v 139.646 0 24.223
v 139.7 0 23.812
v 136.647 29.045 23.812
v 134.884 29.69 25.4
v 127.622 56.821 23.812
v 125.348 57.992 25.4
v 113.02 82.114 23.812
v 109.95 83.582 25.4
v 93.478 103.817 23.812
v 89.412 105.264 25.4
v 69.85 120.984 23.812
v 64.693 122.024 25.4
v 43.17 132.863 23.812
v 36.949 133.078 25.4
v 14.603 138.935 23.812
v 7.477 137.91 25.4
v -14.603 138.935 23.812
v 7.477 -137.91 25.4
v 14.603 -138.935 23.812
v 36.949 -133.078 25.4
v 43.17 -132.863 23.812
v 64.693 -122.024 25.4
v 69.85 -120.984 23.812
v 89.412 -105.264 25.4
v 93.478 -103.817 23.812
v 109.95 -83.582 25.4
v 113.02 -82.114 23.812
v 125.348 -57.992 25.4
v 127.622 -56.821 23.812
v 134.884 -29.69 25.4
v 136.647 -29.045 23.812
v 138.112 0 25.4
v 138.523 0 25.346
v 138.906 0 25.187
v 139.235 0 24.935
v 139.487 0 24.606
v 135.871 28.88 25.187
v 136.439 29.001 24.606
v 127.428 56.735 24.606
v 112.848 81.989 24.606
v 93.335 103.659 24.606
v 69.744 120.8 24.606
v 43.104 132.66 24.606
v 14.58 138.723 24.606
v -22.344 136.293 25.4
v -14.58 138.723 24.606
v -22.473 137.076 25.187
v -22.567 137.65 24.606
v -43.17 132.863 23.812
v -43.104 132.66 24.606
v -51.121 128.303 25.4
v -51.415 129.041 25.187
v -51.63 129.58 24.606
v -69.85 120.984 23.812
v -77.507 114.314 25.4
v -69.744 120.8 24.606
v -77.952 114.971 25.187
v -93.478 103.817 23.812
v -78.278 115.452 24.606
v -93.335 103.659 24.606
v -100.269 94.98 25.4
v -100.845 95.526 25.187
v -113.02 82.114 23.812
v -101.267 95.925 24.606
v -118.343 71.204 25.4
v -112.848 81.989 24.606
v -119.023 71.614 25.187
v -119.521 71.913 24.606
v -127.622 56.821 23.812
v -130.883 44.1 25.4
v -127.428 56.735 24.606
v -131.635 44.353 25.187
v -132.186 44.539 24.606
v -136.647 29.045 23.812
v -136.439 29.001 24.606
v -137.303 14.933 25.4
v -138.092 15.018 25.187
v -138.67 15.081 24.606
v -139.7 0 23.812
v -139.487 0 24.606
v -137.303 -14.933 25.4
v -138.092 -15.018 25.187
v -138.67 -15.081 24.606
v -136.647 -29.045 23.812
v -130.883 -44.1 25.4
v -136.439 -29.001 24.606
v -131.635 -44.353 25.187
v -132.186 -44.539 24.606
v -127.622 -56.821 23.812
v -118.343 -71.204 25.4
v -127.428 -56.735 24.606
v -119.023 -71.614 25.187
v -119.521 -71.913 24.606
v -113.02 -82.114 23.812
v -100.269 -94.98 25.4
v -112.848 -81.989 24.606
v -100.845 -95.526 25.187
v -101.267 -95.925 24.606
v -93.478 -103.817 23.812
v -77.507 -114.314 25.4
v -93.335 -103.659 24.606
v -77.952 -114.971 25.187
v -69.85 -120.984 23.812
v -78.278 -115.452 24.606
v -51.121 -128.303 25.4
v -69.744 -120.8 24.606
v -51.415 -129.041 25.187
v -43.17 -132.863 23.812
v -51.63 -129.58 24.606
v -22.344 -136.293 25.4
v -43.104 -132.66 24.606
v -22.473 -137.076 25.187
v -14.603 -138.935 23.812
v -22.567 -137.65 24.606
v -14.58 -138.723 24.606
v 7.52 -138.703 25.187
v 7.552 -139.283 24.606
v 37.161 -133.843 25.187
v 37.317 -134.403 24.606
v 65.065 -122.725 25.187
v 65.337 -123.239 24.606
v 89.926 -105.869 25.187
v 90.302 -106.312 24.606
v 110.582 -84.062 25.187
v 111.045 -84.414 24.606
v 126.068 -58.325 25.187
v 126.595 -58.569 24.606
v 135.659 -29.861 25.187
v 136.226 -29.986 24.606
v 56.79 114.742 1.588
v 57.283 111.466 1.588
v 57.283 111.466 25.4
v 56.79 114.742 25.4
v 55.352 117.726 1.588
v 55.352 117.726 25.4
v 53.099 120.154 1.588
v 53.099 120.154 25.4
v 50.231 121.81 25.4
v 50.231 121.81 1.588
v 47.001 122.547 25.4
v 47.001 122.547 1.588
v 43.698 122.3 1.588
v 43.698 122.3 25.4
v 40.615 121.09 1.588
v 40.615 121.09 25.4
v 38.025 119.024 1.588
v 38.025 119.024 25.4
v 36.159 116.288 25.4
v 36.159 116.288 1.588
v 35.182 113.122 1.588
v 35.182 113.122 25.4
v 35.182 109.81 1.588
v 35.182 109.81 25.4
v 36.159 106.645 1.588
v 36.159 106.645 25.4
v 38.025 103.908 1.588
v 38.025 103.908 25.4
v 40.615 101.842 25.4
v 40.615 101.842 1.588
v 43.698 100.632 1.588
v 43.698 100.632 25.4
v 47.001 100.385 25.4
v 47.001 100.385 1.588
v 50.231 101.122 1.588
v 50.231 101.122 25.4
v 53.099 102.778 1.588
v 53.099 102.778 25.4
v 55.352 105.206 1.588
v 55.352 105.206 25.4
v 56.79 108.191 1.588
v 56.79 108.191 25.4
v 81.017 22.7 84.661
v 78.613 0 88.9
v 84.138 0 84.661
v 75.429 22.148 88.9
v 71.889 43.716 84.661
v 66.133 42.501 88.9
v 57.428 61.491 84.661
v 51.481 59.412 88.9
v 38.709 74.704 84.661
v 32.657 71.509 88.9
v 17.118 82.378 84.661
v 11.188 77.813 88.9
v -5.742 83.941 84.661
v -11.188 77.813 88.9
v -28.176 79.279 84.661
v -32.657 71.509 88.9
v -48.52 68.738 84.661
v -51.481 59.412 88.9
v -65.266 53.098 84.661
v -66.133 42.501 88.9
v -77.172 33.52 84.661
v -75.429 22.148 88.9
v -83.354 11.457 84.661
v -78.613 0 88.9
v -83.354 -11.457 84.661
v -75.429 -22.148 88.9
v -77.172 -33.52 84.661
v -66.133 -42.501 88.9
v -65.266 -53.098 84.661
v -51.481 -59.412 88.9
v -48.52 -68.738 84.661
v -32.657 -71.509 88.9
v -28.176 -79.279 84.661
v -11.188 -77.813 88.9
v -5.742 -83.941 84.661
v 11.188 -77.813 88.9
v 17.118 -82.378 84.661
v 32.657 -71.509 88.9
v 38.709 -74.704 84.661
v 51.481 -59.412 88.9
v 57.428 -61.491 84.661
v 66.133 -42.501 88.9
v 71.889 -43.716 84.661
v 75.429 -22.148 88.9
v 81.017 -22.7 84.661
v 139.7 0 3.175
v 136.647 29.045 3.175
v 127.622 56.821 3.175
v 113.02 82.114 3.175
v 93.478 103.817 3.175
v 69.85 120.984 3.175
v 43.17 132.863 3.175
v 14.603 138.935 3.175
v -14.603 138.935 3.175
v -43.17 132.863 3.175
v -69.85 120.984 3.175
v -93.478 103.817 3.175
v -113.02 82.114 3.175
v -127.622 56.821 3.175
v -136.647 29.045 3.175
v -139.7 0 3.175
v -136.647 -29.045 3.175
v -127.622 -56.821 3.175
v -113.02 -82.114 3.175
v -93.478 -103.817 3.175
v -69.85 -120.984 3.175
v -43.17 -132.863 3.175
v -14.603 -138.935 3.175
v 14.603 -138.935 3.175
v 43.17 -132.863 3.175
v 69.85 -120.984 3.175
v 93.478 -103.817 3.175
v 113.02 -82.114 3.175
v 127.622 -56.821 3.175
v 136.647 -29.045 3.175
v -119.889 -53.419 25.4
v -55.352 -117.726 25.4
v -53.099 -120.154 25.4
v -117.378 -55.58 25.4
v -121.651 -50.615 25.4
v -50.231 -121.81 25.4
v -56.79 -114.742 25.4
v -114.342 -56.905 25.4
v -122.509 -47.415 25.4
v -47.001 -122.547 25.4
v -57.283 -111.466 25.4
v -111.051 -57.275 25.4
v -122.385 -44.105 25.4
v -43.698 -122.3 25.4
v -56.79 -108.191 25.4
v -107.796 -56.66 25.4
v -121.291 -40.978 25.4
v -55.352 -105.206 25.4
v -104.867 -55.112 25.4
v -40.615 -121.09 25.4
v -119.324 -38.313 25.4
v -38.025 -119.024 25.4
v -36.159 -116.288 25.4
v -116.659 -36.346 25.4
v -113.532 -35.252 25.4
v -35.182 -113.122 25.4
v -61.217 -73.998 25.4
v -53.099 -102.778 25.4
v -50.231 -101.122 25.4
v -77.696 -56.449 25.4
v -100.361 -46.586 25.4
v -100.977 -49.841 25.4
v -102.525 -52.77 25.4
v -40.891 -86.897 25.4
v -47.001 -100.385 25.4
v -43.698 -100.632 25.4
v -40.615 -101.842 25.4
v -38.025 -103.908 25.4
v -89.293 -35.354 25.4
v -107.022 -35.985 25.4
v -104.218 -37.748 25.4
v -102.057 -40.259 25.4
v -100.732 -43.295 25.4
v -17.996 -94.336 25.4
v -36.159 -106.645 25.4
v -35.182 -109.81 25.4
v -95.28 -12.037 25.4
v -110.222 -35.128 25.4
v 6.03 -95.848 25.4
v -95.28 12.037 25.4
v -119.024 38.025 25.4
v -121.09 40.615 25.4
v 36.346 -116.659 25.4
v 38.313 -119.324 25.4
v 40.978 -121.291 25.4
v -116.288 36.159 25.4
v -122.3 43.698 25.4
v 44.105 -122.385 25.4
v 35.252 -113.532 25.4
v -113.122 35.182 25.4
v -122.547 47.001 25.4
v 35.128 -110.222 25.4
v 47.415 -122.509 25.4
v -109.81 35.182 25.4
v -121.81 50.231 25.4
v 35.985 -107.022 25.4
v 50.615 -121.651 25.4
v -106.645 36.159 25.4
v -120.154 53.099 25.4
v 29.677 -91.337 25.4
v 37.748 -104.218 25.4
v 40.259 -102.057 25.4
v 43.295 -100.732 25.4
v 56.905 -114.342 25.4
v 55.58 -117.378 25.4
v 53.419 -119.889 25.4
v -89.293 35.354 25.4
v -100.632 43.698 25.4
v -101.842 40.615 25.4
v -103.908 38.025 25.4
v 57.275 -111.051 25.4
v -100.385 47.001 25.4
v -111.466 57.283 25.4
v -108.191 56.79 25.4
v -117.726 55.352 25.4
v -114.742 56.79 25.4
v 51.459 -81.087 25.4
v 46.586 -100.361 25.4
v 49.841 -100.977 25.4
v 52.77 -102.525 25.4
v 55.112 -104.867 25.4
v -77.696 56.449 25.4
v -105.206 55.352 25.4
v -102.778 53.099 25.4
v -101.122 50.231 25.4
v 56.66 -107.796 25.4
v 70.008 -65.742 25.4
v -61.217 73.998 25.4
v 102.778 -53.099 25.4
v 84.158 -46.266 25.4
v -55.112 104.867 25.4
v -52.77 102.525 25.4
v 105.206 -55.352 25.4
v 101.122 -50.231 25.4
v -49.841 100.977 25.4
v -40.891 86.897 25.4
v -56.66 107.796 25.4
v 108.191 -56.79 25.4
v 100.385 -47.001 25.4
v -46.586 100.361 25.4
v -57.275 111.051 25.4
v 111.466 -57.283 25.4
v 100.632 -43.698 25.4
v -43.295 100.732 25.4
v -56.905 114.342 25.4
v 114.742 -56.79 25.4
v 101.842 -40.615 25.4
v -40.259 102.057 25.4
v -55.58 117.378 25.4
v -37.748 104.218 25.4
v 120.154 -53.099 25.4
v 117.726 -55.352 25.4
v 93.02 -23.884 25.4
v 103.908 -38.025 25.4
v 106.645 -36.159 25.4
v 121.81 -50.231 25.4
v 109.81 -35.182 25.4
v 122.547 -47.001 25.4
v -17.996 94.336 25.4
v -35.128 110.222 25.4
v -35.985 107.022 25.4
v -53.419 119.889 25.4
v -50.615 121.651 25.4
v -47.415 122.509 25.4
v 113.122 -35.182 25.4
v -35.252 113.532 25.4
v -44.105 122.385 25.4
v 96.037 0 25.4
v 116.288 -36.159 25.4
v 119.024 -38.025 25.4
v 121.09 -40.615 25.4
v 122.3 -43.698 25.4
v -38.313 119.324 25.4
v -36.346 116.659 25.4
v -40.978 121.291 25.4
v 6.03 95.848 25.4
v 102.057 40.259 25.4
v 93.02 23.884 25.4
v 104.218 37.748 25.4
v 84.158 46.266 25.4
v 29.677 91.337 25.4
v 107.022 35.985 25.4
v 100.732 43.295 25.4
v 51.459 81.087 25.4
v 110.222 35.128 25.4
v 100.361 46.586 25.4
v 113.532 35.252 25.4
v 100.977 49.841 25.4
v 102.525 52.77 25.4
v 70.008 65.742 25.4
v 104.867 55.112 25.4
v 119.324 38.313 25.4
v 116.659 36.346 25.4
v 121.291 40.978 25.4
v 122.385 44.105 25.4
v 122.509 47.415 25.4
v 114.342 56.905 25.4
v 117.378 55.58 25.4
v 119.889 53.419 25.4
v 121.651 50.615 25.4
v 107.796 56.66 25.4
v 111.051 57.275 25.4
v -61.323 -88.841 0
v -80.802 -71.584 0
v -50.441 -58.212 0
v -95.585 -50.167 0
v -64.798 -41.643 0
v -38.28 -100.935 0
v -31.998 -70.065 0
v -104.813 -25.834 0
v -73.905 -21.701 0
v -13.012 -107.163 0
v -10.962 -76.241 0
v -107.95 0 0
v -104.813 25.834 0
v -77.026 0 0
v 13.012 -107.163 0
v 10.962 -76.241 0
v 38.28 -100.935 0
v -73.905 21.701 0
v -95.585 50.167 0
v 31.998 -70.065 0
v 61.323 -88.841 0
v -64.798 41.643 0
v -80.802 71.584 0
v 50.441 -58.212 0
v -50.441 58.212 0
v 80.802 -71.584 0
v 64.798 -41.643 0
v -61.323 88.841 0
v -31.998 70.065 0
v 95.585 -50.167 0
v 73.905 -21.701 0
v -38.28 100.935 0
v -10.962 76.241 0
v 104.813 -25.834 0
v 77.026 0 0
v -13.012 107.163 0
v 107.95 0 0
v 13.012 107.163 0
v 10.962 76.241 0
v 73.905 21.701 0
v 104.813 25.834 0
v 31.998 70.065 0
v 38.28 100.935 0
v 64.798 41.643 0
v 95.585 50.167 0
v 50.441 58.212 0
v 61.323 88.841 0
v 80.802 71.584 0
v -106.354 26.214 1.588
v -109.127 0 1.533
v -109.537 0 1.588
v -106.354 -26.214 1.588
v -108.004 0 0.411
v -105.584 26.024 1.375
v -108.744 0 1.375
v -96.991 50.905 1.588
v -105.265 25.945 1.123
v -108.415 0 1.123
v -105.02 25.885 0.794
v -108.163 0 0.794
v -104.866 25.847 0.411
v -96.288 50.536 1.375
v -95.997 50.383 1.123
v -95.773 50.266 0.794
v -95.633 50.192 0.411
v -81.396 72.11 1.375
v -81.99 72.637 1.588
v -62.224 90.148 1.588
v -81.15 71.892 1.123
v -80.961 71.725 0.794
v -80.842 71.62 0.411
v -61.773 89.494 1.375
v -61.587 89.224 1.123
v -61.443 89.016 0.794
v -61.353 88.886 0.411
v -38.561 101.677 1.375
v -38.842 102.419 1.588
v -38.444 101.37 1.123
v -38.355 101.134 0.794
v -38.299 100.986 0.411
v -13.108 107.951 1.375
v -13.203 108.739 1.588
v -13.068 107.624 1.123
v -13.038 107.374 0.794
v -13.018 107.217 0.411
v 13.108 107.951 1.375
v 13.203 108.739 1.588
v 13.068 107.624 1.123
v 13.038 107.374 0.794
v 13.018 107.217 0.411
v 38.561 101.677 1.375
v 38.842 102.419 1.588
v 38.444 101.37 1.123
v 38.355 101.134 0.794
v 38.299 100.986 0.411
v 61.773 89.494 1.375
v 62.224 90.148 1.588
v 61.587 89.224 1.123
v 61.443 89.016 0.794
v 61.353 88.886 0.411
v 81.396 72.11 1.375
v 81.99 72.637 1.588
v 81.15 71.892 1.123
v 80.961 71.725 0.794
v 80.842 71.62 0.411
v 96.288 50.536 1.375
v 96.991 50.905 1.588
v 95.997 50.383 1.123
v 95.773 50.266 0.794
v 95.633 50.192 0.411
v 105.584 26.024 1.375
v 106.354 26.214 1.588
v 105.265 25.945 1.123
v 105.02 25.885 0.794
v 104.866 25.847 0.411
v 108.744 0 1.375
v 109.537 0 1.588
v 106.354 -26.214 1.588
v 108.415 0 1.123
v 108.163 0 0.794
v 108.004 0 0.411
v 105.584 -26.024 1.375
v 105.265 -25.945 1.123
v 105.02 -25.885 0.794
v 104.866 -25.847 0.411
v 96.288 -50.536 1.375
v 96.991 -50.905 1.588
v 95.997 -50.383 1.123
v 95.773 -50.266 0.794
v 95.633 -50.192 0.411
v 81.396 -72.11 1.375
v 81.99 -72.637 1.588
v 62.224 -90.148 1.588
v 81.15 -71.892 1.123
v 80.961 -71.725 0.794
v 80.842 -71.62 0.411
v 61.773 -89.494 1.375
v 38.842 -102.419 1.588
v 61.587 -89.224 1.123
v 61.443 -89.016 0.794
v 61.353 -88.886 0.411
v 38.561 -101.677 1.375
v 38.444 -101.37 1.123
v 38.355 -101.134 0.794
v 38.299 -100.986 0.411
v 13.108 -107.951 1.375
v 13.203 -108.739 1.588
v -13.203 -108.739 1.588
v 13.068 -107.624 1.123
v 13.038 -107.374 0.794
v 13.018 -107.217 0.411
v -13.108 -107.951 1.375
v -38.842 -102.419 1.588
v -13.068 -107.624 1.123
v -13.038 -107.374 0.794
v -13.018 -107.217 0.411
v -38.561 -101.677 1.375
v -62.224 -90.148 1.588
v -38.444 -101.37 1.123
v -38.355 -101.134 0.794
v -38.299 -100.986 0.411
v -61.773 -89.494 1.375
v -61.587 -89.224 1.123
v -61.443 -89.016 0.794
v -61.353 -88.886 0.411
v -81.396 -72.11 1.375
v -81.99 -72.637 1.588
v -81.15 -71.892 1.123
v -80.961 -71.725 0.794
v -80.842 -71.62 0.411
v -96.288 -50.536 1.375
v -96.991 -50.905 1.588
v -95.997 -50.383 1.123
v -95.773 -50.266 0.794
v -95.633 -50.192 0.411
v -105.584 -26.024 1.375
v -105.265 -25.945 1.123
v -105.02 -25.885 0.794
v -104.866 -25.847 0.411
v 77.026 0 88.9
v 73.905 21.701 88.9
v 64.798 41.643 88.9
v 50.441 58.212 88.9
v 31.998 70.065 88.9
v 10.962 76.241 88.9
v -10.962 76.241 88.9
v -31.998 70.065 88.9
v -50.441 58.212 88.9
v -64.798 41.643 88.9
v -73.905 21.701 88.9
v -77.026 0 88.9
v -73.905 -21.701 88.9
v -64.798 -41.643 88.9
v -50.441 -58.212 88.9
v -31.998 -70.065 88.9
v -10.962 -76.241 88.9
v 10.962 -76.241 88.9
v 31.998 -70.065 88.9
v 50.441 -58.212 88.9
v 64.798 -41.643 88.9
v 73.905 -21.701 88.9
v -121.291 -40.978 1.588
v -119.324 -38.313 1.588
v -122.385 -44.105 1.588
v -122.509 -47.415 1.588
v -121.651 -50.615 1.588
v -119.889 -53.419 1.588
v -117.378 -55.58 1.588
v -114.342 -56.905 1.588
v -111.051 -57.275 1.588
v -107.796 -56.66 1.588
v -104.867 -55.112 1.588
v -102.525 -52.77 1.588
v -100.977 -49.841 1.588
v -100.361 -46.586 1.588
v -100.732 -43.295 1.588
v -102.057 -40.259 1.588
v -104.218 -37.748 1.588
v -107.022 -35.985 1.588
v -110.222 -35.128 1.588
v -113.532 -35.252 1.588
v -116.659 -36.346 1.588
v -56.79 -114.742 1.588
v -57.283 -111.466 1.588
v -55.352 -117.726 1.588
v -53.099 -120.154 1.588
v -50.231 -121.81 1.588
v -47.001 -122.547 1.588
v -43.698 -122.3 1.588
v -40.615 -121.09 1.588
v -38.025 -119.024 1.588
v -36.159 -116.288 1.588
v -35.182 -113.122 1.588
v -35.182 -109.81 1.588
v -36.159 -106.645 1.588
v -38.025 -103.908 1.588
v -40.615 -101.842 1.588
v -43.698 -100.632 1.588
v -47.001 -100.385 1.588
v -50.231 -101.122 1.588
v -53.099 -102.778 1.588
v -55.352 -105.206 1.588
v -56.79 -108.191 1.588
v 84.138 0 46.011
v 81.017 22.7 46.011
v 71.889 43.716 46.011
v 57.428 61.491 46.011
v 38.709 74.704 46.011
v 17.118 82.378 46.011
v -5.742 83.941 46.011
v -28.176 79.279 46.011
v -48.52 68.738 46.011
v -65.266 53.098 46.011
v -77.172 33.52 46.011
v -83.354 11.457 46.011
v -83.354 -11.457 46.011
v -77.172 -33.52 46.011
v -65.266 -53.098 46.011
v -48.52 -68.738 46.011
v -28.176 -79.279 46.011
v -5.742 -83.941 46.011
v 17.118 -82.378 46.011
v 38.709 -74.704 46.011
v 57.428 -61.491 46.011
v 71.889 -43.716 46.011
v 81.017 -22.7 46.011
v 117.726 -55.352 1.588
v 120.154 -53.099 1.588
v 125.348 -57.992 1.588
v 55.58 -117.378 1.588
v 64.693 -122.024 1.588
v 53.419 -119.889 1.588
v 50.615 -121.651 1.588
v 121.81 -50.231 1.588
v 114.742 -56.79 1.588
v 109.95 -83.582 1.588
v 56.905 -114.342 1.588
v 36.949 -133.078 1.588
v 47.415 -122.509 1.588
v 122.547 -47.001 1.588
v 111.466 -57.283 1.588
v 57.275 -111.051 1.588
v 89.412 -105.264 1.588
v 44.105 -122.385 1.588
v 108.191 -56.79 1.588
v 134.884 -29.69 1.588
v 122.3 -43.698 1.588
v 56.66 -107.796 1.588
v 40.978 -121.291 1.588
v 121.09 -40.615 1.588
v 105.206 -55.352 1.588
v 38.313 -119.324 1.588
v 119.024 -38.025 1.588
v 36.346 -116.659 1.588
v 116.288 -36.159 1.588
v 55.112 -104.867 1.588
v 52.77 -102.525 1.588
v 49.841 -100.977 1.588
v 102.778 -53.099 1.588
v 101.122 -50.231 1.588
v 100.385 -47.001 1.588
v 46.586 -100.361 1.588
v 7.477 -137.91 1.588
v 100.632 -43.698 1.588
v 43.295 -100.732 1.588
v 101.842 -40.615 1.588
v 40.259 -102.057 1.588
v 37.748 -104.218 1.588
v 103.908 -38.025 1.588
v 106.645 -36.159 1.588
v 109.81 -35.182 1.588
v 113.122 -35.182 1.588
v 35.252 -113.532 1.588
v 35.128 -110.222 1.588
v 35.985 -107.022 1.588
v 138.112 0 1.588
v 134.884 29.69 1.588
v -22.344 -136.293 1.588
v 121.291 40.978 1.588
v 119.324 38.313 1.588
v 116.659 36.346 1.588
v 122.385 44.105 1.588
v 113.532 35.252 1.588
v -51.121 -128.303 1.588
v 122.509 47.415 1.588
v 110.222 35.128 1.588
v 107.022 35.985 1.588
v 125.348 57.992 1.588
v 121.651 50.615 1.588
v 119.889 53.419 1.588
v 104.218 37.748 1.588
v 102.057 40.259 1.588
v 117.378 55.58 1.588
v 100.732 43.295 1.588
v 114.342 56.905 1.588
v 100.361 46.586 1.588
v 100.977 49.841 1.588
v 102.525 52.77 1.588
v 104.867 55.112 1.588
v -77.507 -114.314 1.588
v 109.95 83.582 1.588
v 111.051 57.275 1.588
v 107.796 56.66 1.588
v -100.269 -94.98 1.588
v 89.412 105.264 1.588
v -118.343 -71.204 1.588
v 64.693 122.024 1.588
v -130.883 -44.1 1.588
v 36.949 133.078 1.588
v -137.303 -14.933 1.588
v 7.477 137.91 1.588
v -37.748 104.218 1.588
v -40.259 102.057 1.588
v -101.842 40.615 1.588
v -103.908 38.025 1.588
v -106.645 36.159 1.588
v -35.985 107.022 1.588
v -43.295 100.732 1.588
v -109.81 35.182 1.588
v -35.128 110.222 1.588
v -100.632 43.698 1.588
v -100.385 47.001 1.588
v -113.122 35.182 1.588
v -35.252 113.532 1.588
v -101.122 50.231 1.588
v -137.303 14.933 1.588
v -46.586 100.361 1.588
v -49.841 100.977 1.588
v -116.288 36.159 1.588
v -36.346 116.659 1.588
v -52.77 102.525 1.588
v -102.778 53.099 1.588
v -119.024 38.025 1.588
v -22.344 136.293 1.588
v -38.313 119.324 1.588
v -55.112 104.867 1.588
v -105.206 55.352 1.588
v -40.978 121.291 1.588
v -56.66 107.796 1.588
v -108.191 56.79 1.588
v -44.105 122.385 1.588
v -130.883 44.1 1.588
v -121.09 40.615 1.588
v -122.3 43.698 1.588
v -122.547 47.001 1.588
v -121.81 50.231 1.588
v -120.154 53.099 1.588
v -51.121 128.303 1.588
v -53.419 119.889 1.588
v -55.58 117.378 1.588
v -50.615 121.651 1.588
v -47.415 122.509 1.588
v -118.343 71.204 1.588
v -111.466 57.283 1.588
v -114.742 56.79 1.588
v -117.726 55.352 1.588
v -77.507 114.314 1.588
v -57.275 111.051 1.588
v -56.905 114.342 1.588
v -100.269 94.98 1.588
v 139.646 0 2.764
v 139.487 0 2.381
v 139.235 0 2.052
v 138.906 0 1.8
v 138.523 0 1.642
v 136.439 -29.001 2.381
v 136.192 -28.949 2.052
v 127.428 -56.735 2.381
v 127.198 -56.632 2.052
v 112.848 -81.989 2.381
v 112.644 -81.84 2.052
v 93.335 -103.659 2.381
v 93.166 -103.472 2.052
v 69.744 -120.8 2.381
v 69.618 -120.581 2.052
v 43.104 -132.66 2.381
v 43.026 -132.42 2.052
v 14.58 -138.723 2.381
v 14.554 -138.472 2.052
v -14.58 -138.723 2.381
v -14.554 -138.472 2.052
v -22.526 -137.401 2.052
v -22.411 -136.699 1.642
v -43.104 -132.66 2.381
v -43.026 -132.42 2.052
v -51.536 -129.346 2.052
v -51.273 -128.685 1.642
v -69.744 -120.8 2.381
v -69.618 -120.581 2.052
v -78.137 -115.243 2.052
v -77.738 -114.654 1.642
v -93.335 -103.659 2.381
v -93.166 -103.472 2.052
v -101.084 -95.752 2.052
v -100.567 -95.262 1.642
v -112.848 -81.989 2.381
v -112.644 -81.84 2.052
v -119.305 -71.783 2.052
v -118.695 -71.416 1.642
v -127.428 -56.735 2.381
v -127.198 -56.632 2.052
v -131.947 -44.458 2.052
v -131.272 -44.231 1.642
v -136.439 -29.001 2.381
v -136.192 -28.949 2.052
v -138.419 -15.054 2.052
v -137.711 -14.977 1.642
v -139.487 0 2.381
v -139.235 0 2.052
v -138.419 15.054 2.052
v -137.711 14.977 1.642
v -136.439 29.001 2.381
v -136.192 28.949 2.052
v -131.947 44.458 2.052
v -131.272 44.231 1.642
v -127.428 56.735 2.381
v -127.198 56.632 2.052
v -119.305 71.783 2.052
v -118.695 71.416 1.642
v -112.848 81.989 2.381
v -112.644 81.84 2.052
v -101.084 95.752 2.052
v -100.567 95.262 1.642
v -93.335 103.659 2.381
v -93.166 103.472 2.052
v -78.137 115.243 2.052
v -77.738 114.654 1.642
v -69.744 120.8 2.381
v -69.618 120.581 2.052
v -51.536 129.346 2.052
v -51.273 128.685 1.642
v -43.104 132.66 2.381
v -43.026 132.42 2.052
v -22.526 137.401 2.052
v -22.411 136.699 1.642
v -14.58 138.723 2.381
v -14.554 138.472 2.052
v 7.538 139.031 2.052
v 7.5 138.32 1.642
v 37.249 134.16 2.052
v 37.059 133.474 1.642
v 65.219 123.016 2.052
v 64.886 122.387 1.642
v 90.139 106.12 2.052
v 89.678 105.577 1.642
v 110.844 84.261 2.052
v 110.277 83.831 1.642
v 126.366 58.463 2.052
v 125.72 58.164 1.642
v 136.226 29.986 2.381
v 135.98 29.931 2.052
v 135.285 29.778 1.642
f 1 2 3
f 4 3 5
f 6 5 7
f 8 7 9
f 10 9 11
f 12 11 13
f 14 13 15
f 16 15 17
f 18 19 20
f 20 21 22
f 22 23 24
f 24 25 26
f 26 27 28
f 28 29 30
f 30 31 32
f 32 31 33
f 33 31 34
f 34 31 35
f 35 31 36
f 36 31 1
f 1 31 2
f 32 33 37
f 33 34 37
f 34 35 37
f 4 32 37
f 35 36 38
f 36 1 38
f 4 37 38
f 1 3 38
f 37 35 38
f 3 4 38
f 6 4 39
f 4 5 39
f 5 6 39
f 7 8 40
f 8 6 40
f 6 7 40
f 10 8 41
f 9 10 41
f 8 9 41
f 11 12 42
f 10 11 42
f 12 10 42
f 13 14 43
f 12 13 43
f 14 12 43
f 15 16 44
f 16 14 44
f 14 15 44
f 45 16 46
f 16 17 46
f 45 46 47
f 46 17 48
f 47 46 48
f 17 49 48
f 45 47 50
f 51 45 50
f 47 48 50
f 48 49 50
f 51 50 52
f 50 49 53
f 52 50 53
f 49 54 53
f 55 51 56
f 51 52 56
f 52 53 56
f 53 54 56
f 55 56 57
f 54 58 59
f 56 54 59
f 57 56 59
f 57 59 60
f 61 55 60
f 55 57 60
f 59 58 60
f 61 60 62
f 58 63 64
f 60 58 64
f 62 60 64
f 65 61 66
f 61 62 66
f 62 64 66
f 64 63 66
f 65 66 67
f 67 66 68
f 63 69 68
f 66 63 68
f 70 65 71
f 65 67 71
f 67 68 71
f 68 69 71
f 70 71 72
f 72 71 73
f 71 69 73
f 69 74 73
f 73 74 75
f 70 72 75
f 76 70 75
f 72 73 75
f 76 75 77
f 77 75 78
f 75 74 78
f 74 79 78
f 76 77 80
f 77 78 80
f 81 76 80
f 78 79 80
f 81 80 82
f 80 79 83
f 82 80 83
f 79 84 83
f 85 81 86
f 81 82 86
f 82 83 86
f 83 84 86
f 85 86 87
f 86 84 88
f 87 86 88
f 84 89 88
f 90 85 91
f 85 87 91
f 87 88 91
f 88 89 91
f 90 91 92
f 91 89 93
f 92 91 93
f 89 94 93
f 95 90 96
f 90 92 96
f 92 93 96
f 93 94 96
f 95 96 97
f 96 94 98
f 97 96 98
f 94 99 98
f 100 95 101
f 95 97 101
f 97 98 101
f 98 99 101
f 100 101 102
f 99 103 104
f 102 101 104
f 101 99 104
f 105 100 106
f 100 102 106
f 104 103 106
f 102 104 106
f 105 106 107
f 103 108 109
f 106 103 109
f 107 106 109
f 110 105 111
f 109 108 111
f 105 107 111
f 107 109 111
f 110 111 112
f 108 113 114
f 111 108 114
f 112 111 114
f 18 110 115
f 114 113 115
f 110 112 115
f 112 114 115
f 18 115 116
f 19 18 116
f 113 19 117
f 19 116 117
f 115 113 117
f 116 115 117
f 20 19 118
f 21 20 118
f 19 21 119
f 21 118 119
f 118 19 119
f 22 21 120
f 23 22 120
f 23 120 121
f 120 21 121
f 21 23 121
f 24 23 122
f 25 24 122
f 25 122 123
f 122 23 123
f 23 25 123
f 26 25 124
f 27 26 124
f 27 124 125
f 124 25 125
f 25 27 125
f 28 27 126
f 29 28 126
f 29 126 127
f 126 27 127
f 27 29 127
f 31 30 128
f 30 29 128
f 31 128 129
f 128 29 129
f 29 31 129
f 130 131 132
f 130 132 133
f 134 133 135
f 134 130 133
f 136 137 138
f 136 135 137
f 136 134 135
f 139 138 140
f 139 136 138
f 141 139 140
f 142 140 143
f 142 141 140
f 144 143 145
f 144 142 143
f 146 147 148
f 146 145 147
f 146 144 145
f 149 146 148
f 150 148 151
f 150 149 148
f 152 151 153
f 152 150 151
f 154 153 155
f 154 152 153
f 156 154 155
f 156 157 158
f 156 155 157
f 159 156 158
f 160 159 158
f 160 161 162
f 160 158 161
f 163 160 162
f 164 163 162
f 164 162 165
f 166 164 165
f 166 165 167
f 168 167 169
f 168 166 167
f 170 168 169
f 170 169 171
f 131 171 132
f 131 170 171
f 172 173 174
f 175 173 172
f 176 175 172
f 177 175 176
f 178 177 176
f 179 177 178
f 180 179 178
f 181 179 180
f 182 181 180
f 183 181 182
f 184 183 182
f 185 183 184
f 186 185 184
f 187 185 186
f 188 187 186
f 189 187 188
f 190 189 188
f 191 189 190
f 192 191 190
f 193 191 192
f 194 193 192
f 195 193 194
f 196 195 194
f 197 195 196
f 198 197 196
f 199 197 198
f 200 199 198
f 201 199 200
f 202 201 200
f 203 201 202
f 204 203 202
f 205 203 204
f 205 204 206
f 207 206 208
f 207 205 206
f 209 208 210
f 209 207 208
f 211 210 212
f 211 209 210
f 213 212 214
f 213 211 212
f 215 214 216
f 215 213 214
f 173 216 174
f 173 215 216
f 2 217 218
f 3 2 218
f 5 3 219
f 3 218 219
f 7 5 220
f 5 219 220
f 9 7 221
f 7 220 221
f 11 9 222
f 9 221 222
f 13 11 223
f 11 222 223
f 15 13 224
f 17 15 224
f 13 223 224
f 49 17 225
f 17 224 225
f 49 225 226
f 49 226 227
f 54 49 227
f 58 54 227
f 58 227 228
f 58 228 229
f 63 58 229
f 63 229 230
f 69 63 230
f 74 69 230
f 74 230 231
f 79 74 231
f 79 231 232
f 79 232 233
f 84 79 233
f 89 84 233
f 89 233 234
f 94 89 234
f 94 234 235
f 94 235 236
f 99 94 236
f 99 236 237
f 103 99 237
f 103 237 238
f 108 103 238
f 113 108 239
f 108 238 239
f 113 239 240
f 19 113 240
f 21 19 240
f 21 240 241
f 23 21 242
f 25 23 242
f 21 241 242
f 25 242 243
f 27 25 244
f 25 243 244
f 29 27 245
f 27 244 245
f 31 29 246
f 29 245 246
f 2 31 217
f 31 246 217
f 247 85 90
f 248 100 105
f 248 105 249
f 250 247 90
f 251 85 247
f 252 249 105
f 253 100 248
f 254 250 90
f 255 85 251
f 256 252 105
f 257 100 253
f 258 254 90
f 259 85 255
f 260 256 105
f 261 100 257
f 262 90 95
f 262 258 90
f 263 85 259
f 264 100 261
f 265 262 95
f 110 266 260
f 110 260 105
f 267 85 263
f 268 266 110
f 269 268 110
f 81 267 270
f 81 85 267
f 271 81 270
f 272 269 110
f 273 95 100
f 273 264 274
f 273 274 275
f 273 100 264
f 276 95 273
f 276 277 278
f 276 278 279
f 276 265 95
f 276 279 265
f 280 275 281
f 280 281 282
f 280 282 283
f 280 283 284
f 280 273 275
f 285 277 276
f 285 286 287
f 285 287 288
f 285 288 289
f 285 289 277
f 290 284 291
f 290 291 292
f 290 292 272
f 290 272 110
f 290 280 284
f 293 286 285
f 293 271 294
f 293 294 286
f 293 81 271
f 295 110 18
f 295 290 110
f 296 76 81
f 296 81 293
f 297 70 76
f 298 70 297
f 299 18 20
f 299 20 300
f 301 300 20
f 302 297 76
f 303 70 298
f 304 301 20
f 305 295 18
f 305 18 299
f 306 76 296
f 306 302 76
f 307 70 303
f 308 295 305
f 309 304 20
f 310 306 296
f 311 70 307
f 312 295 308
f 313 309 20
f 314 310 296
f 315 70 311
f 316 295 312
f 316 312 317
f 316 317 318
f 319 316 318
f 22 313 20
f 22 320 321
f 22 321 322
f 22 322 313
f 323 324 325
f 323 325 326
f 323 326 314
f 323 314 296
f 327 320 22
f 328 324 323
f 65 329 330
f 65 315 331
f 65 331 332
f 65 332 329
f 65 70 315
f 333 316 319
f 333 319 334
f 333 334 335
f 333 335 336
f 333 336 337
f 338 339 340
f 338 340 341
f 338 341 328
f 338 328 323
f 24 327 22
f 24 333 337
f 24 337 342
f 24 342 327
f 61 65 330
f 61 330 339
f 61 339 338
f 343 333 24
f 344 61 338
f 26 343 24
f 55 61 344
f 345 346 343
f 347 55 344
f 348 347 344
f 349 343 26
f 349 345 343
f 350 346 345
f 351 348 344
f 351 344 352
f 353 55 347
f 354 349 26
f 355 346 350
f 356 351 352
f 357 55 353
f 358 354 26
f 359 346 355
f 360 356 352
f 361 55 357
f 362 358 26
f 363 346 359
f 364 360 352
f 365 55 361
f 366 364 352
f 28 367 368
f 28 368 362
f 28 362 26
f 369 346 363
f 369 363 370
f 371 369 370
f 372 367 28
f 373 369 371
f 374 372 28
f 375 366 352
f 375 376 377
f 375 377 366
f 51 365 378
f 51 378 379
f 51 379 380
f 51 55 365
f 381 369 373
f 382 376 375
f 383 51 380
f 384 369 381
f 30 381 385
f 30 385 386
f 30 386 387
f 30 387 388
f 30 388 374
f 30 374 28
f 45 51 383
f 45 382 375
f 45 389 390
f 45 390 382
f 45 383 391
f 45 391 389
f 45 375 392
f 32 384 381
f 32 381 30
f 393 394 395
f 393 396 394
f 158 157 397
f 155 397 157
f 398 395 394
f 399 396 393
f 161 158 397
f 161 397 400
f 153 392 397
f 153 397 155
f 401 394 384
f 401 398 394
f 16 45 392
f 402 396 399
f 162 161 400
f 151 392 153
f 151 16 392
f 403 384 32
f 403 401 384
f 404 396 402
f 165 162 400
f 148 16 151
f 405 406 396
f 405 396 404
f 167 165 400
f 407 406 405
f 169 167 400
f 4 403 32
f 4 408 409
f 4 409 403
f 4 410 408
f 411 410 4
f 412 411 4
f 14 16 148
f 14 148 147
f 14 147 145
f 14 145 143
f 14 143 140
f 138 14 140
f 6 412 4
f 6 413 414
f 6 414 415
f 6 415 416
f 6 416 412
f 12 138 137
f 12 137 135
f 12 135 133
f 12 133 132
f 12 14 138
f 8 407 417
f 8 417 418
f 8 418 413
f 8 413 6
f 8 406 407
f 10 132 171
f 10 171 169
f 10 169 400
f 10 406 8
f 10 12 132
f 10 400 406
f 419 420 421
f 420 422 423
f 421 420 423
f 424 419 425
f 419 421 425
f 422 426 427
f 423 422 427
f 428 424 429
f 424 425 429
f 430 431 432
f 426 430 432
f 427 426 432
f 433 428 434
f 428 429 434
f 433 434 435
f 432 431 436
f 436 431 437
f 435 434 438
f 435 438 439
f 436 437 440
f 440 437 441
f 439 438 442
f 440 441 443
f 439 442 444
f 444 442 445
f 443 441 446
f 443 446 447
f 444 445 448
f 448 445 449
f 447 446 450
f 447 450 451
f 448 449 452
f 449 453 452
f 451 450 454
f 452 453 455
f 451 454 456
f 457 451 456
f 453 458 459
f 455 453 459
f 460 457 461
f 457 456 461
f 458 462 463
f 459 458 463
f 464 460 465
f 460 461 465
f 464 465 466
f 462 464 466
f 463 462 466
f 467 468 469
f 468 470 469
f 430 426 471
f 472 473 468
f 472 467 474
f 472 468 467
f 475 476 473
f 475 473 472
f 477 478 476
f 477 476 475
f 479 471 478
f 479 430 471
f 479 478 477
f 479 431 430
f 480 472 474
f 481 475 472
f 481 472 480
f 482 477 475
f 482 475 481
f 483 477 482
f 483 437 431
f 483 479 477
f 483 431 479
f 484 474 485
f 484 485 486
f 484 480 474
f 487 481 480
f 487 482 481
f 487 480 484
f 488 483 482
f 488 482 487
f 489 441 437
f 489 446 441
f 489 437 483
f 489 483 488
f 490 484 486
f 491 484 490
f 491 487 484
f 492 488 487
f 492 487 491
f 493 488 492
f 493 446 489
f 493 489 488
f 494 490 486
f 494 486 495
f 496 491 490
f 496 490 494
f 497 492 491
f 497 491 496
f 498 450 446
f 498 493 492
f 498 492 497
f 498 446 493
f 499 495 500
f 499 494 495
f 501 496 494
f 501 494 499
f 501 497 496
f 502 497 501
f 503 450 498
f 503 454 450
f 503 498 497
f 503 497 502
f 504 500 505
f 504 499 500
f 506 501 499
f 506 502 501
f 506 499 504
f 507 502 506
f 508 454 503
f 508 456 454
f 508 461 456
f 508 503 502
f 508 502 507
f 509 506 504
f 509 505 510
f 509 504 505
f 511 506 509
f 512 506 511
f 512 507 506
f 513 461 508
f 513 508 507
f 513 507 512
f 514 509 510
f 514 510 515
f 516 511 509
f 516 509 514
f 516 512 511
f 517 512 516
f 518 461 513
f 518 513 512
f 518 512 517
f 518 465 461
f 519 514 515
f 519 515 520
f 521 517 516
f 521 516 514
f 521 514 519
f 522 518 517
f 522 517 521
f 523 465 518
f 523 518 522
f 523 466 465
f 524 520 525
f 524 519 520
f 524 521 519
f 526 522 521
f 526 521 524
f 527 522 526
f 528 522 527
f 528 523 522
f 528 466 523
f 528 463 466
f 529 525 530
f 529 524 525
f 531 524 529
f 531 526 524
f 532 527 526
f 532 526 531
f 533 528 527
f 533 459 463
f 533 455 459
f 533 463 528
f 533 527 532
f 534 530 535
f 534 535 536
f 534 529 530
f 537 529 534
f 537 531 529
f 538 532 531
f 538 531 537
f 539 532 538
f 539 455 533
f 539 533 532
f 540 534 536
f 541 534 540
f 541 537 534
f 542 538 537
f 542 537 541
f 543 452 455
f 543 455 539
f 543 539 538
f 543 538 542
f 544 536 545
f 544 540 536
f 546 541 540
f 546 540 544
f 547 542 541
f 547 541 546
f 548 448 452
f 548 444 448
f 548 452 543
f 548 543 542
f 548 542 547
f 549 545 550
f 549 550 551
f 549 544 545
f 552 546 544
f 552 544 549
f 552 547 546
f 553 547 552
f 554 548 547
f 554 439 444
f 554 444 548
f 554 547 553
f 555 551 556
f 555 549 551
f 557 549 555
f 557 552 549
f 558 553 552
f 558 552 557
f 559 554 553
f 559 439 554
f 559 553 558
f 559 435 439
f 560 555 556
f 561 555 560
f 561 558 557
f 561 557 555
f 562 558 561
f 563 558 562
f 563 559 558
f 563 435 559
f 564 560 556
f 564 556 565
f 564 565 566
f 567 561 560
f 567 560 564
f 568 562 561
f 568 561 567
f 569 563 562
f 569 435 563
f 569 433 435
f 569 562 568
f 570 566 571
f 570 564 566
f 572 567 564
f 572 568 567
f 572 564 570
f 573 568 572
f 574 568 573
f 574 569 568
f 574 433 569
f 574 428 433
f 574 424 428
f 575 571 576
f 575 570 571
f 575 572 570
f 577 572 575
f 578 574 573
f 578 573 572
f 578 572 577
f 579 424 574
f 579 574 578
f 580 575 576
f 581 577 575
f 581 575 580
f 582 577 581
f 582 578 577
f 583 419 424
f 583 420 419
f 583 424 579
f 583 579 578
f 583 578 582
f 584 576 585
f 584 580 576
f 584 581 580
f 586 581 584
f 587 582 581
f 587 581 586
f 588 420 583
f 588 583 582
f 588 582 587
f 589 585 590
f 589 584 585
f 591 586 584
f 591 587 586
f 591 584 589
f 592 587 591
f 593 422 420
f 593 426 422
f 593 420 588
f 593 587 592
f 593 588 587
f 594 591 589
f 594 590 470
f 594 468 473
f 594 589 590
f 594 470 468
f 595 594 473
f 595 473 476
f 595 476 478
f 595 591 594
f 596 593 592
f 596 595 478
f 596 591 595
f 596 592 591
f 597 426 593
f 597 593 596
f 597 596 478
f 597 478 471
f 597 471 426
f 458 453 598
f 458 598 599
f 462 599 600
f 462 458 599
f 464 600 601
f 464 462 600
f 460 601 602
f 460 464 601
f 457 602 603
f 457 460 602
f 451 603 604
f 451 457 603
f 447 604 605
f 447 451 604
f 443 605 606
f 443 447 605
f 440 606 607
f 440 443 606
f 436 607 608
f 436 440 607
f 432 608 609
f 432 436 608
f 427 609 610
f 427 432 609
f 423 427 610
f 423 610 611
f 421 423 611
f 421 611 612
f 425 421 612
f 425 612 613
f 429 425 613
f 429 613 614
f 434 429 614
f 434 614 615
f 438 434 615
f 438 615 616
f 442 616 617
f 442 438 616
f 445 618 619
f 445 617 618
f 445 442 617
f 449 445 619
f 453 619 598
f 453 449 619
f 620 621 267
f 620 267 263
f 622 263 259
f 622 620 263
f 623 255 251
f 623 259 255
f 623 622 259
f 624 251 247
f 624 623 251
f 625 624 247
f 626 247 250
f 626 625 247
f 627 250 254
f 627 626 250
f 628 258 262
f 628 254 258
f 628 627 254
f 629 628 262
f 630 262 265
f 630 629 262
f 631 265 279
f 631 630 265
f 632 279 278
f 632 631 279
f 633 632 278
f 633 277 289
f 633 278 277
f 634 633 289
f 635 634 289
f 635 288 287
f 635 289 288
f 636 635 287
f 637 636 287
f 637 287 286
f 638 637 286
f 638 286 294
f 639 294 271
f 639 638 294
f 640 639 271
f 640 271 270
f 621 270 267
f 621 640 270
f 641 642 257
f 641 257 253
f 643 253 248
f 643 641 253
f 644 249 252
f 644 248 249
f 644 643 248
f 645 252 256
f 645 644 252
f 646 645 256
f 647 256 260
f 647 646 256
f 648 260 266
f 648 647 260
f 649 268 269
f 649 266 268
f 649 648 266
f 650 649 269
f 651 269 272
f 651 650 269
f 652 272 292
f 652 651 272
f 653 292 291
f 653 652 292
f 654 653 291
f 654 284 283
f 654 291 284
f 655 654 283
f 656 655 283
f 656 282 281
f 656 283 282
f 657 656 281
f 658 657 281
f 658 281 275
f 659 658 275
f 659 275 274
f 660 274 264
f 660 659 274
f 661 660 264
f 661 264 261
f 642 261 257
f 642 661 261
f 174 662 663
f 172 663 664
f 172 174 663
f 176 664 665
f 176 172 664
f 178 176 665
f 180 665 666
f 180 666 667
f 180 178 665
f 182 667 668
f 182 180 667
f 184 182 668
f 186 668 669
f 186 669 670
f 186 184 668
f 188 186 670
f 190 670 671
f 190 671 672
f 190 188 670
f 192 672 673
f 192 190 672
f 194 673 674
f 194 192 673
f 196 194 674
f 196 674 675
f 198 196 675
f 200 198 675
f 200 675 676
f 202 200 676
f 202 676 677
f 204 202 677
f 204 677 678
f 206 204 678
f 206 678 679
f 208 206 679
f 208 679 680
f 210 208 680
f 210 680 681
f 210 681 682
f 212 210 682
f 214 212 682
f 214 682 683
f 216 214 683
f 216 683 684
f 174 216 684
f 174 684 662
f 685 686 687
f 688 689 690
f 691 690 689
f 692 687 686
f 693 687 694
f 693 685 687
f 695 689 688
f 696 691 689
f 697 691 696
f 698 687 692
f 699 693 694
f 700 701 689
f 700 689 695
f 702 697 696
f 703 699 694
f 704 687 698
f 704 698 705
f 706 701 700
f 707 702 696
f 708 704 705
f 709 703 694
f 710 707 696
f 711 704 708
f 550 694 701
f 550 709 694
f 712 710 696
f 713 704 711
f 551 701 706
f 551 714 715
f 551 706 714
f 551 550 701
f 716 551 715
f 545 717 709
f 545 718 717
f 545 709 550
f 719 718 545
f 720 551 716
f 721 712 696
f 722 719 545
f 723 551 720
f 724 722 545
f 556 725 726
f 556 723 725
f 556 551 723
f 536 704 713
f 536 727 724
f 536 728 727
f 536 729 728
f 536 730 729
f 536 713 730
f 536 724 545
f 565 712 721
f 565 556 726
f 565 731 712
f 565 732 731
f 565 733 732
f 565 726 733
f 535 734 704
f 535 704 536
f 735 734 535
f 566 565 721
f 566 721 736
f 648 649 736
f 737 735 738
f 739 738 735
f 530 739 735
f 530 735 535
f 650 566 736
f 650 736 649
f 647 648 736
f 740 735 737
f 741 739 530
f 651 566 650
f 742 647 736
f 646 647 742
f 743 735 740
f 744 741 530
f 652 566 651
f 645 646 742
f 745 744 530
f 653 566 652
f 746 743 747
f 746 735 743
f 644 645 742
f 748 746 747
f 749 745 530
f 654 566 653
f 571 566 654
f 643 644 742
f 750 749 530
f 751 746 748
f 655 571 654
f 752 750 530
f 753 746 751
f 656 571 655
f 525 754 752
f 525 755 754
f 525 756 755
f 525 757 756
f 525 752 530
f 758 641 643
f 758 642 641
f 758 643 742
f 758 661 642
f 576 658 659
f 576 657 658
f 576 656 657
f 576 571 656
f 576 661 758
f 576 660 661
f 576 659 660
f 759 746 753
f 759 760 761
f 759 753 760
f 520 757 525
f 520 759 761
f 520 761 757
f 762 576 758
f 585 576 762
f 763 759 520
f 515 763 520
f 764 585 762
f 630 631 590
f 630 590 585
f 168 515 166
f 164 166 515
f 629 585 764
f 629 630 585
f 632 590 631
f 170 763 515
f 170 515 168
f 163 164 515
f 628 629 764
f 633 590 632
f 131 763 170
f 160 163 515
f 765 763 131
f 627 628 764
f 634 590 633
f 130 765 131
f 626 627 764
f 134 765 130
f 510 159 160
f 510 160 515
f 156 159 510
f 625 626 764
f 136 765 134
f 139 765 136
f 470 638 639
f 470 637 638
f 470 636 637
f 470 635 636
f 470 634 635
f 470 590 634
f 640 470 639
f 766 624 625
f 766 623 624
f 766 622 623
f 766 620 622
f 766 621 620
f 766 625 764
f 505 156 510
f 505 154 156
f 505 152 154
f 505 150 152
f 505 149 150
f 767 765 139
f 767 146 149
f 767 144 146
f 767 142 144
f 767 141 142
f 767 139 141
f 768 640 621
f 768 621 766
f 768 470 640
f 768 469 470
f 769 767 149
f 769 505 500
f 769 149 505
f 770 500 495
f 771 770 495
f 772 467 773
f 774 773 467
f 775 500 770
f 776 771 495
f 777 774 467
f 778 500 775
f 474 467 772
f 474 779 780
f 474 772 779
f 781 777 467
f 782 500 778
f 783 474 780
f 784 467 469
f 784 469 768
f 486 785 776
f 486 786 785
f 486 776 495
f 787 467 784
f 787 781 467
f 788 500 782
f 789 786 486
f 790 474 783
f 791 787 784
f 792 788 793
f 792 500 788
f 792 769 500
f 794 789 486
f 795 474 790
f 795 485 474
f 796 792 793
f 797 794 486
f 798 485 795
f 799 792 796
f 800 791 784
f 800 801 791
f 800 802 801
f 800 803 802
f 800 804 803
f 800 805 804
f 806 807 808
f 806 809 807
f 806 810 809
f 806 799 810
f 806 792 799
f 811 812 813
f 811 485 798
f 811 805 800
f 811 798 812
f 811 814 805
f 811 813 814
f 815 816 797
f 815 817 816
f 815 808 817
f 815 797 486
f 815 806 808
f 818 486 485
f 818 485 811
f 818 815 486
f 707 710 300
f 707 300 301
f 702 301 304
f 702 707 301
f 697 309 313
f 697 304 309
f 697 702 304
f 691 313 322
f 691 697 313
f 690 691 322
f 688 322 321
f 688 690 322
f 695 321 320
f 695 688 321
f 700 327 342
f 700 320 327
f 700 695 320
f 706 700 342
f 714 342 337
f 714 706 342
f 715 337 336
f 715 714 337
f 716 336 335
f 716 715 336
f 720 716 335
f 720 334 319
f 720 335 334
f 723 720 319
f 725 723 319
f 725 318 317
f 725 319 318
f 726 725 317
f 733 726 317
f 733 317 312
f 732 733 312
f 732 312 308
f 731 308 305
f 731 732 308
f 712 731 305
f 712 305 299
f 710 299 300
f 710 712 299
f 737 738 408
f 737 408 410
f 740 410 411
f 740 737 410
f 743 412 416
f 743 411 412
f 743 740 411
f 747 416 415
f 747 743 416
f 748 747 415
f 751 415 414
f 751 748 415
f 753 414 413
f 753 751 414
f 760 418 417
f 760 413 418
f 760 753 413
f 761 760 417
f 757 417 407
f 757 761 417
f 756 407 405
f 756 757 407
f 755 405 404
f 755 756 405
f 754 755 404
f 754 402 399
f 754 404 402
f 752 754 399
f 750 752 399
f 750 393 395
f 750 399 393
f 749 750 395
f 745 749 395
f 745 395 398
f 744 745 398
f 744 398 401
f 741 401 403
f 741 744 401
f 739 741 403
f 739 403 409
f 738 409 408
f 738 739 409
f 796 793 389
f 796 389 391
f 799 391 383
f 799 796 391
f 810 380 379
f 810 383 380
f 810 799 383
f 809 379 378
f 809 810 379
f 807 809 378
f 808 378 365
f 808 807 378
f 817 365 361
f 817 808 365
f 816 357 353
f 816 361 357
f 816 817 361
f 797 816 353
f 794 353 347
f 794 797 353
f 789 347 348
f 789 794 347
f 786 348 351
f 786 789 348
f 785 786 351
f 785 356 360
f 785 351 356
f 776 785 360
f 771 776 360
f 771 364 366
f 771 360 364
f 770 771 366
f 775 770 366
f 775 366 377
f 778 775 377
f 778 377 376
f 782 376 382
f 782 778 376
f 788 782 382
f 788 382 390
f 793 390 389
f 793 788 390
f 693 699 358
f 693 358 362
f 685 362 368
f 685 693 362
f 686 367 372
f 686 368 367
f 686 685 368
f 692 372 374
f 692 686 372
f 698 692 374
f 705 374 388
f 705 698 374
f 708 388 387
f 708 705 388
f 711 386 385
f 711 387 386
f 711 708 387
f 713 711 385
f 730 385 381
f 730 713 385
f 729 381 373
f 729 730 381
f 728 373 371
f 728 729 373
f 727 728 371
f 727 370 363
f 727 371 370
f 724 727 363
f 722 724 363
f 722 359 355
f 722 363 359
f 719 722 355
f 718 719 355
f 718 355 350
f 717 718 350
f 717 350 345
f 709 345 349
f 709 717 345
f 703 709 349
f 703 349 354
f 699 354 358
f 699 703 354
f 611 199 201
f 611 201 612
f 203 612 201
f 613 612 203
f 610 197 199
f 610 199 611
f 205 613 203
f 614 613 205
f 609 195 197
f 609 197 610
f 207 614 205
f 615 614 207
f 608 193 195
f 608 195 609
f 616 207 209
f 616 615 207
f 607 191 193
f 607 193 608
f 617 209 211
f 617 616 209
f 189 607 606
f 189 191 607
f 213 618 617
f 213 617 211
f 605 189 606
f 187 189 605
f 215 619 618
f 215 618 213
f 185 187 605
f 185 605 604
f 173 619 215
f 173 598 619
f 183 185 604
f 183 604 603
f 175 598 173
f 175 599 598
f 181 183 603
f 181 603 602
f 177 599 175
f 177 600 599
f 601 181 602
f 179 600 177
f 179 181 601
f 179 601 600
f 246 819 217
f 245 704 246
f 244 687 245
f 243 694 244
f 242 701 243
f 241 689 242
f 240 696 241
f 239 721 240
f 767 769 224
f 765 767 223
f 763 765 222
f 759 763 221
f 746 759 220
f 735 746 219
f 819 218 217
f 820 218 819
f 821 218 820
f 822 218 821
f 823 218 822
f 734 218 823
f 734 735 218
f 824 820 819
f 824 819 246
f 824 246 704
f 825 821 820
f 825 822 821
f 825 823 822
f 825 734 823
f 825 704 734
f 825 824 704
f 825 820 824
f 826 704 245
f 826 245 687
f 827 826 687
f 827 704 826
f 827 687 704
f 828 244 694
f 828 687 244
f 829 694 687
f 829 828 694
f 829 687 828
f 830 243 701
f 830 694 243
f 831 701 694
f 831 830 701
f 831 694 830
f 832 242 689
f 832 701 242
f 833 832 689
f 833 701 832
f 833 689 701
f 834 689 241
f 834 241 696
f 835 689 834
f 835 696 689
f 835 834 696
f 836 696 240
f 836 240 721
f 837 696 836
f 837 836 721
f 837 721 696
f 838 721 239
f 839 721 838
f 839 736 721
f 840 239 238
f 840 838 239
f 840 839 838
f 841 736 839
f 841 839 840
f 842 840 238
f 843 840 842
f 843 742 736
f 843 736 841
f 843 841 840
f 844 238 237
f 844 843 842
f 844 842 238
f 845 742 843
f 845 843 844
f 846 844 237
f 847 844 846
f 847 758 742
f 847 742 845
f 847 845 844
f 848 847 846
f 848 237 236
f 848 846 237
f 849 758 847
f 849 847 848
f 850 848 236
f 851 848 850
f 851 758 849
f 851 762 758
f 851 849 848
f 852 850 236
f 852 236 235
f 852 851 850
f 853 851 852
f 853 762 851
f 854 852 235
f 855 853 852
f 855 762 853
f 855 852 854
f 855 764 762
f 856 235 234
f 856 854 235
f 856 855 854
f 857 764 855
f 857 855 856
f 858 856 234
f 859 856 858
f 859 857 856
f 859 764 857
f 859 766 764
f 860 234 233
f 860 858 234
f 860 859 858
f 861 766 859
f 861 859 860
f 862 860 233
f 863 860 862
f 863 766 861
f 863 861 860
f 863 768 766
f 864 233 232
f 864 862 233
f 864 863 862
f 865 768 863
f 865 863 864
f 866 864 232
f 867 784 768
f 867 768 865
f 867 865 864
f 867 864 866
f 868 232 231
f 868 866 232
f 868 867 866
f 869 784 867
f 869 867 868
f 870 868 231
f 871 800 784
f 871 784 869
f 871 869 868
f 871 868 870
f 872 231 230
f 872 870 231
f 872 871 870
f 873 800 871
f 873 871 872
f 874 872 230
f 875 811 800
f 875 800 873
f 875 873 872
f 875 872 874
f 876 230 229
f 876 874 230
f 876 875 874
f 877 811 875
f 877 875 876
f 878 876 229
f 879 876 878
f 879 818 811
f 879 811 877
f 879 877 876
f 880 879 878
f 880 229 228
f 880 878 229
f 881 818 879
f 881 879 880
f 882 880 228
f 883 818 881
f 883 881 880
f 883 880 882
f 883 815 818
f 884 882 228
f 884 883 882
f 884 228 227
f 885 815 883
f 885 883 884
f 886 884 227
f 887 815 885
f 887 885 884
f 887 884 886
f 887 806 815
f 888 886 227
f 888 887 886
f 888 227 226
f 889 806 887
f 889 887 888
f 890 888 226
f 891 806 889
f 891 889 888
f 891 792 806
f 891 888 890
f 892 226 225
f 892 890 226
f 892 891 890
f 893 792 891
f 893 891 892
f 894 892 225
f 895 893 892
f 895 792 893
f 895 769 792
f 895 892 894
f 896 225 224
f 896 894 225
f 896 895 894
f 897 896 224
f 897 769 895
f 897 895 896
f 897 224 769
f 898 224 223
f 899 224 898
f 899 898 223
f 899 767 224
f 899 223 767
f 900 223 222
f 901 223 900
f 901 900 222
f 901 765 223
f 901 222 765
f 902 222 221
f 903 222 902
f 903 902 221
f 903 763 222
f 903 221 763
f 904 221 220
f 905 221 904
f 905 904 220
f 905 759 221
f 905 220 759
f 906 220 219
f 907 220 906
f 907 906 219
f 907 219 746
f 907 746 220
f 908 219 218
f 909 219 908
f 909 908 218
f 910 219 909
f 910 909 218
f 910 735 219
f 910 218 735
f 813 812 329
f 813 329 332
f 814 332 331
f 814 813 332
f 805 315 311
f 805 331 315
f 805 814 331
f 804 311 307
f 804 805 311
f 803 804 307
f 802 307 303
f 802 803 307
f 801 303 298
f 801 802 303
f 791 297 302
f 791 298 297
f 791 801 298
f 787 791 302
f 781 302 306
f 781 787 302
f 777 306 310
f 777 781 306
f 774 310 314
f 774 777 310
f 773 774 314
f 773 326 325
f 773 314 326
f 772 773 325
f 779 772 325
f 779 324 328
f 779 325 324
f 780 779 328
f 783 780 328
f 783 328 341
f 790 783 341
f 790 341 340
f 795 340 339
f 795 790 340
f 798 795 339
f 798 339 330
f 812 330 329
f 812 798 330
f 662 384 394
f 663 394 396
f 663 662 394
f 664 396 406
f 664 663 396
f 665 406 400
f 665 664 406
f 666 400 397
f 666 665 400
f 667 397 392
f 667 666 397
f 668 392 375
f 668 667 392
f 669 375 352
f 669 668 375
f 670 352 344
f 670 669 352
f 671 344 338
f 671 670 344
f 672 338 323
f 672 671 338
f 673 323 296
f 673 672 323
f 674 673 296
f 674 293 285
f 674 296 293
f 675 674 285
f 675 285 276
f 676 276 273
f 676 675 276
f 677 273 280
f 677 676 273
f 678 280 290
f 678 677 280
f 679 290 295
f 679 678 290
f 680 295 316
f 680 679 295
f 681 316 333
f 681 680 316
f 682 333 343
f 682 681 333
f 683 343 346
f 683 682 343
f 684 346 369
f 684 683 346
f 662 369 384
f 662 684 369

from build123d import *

# Parameters (mm, degrees)
SKETCH1_R                 = 139.7
BOSS_EXTRUDE1_DEPTH       = 25.4
SKETCH2_R                 = 11.1125
BOLTHOLE_DEPTH            = 200.191716695
BOLTHOLEPATTERN_COUNT     = 8
SKETCH5_OUTSIDE_W         = 360.59
SKETCH5_OUTSIDE_H         = 360.59
SKETCH5_OUTSIDE_R         = 107.95
RAISED_FACE_DEPTH         = 1.5875
SKETCH8_R                 = 96.0374
WELD_NECK_120_DRAFT_DEPTH = 63.5
WELD_NECK_120_DRAFT_TAPER = 30
WELD_NECK_END_REACH       = 218.646
SKETCH9_R                 = 84.1375
WELD_NECK_CHAMFER1_SIZE   = 4.239097945
WELD_NECK_CHAMFER1_SIZE2  = 5.5245
SKETCH7_R                 = 77.0255
BORE_DEPTH                = 217.645770787
FILLET2_R                 = 1.5875
FILLET3_R                 = 1.5875


with BuildPart() as part:
    # Sketch1 → Boss-Extrude1 (new body)
    with BuildSketch(Plane.XY):
        Circle(SKETCH1_R)
    extrude(amount=BOSS_EXTRUDE1_DEPTH)

    # Sketch2 → BoltHole (cut, through all)
    with BuildSketch(Plane.XY):
        with Locations((46.170756115, 111.466065597)):
            Circle(SKETCH2_R)
    bolthole = extrude(amount=BOLTHOLE_DEPTH, mode=Mode.SUBTRACT)

    # BoltHolePattern: BoltHole ×8 about axis
    boltholepattern_axis = Axis((0, 0, 0), (0, 0, 1))
    for i in range(1, BOLTHOLEPATTERN_COUNT):
        add(bolthole.rotate(boltholepattern_axis, i * 360 / BOLTHOLEPATTERN_COUNT), mode=Mode.SUBTRACT)

    # Sketch5 outside → Raised Face (cut)
    with BuildSketch(Plane(origin=(0, 0, 0), x_dir=(-1, 0, 0), z_dir=(0, 0, -1))):
        Rectangle(SKETCH5_OUTSIDE_W, SKETCH5_OUTSIDE_H)
        Circle(SKETCH5_OUTSIDE_R, mode=Mode.SUBTRACT)
    extrude(amount=-RAISED_FACE_DEPTH, mode=Mode.SUBTRACT)

    # Sketch8 → Weld Neck 120 Draft (add)
    with BuildSketch(Plane.XY.offset(25.4)):
        Circle(SKETCH8_R)
    extrude(amount=WELD_NECK_120_DRAFT_DEPTH, taper=WELD_NECK_120_DRAFT_TAPER)

    # Sketch9 → Weld Neck End (add, up to next)
    with BuildSketch(Plane.XY.offset(88.9), mode=Mode.PRIVATE) as weld_neck_end_sk1:
        Circle(SKETCH9_R)
    weld_neck_end_tool1 = extrude(weld_neck_end_sk1.sketch, amount=-WELD_NECK_END_REACH, mode=Mode.PRIVATE) - part.part
    add(weld_neck_end_tool1.solids().sort_by_distance((0, 0, 88.9))[0])

    # Weld Neck Chamfer1
    weld_neck_chamfer1_edges = [part.edges().sort_by_distance(p)[0] for p in [
        (-84.1375, 0, 88.9),
    ]]
    weld_neck_chamfer1_side = [part.faces().sort_by_distance(p)[0] for p in [
        (-84.1375, 0, 67.455615702),
    ]]
    chamfer(weld_neck_chamfer1_edges, length=WELD_NECK_CHAMFER1_SIZE, length2=WELD_NECK_CHAMFER1_SIZE2, reference=weld_neck_chamfer1_side[0])

    # Sketch7 → Bore (cut, through all)
    with BuildSketch(Plane.XY):
        Circle(SKETCH7_R)
    extrude(amount=BORE_DEPTH, mode=Mode.SUBTRACT)

    # Fillet2
    fillet2_edges = [part.edges().sort_by_distance(p)[0] for p in [
        (-139.7, 0, 25.4),
        (-139.7, 0, 1.5875),
    ]]
    fillet(fillet2_edges, radius=FILLET2_R)

    # Fillet3
    fillet3_edges = [part.edges().sort_by_distance(p)[0] for p in [
        (107.95, 0, 1.5875),
    ]]
    fillet(fillet3_edges, radius=FILLET3_R - 0.0001)  # a hair under: the kernel refuses the full size


solid = part.part
